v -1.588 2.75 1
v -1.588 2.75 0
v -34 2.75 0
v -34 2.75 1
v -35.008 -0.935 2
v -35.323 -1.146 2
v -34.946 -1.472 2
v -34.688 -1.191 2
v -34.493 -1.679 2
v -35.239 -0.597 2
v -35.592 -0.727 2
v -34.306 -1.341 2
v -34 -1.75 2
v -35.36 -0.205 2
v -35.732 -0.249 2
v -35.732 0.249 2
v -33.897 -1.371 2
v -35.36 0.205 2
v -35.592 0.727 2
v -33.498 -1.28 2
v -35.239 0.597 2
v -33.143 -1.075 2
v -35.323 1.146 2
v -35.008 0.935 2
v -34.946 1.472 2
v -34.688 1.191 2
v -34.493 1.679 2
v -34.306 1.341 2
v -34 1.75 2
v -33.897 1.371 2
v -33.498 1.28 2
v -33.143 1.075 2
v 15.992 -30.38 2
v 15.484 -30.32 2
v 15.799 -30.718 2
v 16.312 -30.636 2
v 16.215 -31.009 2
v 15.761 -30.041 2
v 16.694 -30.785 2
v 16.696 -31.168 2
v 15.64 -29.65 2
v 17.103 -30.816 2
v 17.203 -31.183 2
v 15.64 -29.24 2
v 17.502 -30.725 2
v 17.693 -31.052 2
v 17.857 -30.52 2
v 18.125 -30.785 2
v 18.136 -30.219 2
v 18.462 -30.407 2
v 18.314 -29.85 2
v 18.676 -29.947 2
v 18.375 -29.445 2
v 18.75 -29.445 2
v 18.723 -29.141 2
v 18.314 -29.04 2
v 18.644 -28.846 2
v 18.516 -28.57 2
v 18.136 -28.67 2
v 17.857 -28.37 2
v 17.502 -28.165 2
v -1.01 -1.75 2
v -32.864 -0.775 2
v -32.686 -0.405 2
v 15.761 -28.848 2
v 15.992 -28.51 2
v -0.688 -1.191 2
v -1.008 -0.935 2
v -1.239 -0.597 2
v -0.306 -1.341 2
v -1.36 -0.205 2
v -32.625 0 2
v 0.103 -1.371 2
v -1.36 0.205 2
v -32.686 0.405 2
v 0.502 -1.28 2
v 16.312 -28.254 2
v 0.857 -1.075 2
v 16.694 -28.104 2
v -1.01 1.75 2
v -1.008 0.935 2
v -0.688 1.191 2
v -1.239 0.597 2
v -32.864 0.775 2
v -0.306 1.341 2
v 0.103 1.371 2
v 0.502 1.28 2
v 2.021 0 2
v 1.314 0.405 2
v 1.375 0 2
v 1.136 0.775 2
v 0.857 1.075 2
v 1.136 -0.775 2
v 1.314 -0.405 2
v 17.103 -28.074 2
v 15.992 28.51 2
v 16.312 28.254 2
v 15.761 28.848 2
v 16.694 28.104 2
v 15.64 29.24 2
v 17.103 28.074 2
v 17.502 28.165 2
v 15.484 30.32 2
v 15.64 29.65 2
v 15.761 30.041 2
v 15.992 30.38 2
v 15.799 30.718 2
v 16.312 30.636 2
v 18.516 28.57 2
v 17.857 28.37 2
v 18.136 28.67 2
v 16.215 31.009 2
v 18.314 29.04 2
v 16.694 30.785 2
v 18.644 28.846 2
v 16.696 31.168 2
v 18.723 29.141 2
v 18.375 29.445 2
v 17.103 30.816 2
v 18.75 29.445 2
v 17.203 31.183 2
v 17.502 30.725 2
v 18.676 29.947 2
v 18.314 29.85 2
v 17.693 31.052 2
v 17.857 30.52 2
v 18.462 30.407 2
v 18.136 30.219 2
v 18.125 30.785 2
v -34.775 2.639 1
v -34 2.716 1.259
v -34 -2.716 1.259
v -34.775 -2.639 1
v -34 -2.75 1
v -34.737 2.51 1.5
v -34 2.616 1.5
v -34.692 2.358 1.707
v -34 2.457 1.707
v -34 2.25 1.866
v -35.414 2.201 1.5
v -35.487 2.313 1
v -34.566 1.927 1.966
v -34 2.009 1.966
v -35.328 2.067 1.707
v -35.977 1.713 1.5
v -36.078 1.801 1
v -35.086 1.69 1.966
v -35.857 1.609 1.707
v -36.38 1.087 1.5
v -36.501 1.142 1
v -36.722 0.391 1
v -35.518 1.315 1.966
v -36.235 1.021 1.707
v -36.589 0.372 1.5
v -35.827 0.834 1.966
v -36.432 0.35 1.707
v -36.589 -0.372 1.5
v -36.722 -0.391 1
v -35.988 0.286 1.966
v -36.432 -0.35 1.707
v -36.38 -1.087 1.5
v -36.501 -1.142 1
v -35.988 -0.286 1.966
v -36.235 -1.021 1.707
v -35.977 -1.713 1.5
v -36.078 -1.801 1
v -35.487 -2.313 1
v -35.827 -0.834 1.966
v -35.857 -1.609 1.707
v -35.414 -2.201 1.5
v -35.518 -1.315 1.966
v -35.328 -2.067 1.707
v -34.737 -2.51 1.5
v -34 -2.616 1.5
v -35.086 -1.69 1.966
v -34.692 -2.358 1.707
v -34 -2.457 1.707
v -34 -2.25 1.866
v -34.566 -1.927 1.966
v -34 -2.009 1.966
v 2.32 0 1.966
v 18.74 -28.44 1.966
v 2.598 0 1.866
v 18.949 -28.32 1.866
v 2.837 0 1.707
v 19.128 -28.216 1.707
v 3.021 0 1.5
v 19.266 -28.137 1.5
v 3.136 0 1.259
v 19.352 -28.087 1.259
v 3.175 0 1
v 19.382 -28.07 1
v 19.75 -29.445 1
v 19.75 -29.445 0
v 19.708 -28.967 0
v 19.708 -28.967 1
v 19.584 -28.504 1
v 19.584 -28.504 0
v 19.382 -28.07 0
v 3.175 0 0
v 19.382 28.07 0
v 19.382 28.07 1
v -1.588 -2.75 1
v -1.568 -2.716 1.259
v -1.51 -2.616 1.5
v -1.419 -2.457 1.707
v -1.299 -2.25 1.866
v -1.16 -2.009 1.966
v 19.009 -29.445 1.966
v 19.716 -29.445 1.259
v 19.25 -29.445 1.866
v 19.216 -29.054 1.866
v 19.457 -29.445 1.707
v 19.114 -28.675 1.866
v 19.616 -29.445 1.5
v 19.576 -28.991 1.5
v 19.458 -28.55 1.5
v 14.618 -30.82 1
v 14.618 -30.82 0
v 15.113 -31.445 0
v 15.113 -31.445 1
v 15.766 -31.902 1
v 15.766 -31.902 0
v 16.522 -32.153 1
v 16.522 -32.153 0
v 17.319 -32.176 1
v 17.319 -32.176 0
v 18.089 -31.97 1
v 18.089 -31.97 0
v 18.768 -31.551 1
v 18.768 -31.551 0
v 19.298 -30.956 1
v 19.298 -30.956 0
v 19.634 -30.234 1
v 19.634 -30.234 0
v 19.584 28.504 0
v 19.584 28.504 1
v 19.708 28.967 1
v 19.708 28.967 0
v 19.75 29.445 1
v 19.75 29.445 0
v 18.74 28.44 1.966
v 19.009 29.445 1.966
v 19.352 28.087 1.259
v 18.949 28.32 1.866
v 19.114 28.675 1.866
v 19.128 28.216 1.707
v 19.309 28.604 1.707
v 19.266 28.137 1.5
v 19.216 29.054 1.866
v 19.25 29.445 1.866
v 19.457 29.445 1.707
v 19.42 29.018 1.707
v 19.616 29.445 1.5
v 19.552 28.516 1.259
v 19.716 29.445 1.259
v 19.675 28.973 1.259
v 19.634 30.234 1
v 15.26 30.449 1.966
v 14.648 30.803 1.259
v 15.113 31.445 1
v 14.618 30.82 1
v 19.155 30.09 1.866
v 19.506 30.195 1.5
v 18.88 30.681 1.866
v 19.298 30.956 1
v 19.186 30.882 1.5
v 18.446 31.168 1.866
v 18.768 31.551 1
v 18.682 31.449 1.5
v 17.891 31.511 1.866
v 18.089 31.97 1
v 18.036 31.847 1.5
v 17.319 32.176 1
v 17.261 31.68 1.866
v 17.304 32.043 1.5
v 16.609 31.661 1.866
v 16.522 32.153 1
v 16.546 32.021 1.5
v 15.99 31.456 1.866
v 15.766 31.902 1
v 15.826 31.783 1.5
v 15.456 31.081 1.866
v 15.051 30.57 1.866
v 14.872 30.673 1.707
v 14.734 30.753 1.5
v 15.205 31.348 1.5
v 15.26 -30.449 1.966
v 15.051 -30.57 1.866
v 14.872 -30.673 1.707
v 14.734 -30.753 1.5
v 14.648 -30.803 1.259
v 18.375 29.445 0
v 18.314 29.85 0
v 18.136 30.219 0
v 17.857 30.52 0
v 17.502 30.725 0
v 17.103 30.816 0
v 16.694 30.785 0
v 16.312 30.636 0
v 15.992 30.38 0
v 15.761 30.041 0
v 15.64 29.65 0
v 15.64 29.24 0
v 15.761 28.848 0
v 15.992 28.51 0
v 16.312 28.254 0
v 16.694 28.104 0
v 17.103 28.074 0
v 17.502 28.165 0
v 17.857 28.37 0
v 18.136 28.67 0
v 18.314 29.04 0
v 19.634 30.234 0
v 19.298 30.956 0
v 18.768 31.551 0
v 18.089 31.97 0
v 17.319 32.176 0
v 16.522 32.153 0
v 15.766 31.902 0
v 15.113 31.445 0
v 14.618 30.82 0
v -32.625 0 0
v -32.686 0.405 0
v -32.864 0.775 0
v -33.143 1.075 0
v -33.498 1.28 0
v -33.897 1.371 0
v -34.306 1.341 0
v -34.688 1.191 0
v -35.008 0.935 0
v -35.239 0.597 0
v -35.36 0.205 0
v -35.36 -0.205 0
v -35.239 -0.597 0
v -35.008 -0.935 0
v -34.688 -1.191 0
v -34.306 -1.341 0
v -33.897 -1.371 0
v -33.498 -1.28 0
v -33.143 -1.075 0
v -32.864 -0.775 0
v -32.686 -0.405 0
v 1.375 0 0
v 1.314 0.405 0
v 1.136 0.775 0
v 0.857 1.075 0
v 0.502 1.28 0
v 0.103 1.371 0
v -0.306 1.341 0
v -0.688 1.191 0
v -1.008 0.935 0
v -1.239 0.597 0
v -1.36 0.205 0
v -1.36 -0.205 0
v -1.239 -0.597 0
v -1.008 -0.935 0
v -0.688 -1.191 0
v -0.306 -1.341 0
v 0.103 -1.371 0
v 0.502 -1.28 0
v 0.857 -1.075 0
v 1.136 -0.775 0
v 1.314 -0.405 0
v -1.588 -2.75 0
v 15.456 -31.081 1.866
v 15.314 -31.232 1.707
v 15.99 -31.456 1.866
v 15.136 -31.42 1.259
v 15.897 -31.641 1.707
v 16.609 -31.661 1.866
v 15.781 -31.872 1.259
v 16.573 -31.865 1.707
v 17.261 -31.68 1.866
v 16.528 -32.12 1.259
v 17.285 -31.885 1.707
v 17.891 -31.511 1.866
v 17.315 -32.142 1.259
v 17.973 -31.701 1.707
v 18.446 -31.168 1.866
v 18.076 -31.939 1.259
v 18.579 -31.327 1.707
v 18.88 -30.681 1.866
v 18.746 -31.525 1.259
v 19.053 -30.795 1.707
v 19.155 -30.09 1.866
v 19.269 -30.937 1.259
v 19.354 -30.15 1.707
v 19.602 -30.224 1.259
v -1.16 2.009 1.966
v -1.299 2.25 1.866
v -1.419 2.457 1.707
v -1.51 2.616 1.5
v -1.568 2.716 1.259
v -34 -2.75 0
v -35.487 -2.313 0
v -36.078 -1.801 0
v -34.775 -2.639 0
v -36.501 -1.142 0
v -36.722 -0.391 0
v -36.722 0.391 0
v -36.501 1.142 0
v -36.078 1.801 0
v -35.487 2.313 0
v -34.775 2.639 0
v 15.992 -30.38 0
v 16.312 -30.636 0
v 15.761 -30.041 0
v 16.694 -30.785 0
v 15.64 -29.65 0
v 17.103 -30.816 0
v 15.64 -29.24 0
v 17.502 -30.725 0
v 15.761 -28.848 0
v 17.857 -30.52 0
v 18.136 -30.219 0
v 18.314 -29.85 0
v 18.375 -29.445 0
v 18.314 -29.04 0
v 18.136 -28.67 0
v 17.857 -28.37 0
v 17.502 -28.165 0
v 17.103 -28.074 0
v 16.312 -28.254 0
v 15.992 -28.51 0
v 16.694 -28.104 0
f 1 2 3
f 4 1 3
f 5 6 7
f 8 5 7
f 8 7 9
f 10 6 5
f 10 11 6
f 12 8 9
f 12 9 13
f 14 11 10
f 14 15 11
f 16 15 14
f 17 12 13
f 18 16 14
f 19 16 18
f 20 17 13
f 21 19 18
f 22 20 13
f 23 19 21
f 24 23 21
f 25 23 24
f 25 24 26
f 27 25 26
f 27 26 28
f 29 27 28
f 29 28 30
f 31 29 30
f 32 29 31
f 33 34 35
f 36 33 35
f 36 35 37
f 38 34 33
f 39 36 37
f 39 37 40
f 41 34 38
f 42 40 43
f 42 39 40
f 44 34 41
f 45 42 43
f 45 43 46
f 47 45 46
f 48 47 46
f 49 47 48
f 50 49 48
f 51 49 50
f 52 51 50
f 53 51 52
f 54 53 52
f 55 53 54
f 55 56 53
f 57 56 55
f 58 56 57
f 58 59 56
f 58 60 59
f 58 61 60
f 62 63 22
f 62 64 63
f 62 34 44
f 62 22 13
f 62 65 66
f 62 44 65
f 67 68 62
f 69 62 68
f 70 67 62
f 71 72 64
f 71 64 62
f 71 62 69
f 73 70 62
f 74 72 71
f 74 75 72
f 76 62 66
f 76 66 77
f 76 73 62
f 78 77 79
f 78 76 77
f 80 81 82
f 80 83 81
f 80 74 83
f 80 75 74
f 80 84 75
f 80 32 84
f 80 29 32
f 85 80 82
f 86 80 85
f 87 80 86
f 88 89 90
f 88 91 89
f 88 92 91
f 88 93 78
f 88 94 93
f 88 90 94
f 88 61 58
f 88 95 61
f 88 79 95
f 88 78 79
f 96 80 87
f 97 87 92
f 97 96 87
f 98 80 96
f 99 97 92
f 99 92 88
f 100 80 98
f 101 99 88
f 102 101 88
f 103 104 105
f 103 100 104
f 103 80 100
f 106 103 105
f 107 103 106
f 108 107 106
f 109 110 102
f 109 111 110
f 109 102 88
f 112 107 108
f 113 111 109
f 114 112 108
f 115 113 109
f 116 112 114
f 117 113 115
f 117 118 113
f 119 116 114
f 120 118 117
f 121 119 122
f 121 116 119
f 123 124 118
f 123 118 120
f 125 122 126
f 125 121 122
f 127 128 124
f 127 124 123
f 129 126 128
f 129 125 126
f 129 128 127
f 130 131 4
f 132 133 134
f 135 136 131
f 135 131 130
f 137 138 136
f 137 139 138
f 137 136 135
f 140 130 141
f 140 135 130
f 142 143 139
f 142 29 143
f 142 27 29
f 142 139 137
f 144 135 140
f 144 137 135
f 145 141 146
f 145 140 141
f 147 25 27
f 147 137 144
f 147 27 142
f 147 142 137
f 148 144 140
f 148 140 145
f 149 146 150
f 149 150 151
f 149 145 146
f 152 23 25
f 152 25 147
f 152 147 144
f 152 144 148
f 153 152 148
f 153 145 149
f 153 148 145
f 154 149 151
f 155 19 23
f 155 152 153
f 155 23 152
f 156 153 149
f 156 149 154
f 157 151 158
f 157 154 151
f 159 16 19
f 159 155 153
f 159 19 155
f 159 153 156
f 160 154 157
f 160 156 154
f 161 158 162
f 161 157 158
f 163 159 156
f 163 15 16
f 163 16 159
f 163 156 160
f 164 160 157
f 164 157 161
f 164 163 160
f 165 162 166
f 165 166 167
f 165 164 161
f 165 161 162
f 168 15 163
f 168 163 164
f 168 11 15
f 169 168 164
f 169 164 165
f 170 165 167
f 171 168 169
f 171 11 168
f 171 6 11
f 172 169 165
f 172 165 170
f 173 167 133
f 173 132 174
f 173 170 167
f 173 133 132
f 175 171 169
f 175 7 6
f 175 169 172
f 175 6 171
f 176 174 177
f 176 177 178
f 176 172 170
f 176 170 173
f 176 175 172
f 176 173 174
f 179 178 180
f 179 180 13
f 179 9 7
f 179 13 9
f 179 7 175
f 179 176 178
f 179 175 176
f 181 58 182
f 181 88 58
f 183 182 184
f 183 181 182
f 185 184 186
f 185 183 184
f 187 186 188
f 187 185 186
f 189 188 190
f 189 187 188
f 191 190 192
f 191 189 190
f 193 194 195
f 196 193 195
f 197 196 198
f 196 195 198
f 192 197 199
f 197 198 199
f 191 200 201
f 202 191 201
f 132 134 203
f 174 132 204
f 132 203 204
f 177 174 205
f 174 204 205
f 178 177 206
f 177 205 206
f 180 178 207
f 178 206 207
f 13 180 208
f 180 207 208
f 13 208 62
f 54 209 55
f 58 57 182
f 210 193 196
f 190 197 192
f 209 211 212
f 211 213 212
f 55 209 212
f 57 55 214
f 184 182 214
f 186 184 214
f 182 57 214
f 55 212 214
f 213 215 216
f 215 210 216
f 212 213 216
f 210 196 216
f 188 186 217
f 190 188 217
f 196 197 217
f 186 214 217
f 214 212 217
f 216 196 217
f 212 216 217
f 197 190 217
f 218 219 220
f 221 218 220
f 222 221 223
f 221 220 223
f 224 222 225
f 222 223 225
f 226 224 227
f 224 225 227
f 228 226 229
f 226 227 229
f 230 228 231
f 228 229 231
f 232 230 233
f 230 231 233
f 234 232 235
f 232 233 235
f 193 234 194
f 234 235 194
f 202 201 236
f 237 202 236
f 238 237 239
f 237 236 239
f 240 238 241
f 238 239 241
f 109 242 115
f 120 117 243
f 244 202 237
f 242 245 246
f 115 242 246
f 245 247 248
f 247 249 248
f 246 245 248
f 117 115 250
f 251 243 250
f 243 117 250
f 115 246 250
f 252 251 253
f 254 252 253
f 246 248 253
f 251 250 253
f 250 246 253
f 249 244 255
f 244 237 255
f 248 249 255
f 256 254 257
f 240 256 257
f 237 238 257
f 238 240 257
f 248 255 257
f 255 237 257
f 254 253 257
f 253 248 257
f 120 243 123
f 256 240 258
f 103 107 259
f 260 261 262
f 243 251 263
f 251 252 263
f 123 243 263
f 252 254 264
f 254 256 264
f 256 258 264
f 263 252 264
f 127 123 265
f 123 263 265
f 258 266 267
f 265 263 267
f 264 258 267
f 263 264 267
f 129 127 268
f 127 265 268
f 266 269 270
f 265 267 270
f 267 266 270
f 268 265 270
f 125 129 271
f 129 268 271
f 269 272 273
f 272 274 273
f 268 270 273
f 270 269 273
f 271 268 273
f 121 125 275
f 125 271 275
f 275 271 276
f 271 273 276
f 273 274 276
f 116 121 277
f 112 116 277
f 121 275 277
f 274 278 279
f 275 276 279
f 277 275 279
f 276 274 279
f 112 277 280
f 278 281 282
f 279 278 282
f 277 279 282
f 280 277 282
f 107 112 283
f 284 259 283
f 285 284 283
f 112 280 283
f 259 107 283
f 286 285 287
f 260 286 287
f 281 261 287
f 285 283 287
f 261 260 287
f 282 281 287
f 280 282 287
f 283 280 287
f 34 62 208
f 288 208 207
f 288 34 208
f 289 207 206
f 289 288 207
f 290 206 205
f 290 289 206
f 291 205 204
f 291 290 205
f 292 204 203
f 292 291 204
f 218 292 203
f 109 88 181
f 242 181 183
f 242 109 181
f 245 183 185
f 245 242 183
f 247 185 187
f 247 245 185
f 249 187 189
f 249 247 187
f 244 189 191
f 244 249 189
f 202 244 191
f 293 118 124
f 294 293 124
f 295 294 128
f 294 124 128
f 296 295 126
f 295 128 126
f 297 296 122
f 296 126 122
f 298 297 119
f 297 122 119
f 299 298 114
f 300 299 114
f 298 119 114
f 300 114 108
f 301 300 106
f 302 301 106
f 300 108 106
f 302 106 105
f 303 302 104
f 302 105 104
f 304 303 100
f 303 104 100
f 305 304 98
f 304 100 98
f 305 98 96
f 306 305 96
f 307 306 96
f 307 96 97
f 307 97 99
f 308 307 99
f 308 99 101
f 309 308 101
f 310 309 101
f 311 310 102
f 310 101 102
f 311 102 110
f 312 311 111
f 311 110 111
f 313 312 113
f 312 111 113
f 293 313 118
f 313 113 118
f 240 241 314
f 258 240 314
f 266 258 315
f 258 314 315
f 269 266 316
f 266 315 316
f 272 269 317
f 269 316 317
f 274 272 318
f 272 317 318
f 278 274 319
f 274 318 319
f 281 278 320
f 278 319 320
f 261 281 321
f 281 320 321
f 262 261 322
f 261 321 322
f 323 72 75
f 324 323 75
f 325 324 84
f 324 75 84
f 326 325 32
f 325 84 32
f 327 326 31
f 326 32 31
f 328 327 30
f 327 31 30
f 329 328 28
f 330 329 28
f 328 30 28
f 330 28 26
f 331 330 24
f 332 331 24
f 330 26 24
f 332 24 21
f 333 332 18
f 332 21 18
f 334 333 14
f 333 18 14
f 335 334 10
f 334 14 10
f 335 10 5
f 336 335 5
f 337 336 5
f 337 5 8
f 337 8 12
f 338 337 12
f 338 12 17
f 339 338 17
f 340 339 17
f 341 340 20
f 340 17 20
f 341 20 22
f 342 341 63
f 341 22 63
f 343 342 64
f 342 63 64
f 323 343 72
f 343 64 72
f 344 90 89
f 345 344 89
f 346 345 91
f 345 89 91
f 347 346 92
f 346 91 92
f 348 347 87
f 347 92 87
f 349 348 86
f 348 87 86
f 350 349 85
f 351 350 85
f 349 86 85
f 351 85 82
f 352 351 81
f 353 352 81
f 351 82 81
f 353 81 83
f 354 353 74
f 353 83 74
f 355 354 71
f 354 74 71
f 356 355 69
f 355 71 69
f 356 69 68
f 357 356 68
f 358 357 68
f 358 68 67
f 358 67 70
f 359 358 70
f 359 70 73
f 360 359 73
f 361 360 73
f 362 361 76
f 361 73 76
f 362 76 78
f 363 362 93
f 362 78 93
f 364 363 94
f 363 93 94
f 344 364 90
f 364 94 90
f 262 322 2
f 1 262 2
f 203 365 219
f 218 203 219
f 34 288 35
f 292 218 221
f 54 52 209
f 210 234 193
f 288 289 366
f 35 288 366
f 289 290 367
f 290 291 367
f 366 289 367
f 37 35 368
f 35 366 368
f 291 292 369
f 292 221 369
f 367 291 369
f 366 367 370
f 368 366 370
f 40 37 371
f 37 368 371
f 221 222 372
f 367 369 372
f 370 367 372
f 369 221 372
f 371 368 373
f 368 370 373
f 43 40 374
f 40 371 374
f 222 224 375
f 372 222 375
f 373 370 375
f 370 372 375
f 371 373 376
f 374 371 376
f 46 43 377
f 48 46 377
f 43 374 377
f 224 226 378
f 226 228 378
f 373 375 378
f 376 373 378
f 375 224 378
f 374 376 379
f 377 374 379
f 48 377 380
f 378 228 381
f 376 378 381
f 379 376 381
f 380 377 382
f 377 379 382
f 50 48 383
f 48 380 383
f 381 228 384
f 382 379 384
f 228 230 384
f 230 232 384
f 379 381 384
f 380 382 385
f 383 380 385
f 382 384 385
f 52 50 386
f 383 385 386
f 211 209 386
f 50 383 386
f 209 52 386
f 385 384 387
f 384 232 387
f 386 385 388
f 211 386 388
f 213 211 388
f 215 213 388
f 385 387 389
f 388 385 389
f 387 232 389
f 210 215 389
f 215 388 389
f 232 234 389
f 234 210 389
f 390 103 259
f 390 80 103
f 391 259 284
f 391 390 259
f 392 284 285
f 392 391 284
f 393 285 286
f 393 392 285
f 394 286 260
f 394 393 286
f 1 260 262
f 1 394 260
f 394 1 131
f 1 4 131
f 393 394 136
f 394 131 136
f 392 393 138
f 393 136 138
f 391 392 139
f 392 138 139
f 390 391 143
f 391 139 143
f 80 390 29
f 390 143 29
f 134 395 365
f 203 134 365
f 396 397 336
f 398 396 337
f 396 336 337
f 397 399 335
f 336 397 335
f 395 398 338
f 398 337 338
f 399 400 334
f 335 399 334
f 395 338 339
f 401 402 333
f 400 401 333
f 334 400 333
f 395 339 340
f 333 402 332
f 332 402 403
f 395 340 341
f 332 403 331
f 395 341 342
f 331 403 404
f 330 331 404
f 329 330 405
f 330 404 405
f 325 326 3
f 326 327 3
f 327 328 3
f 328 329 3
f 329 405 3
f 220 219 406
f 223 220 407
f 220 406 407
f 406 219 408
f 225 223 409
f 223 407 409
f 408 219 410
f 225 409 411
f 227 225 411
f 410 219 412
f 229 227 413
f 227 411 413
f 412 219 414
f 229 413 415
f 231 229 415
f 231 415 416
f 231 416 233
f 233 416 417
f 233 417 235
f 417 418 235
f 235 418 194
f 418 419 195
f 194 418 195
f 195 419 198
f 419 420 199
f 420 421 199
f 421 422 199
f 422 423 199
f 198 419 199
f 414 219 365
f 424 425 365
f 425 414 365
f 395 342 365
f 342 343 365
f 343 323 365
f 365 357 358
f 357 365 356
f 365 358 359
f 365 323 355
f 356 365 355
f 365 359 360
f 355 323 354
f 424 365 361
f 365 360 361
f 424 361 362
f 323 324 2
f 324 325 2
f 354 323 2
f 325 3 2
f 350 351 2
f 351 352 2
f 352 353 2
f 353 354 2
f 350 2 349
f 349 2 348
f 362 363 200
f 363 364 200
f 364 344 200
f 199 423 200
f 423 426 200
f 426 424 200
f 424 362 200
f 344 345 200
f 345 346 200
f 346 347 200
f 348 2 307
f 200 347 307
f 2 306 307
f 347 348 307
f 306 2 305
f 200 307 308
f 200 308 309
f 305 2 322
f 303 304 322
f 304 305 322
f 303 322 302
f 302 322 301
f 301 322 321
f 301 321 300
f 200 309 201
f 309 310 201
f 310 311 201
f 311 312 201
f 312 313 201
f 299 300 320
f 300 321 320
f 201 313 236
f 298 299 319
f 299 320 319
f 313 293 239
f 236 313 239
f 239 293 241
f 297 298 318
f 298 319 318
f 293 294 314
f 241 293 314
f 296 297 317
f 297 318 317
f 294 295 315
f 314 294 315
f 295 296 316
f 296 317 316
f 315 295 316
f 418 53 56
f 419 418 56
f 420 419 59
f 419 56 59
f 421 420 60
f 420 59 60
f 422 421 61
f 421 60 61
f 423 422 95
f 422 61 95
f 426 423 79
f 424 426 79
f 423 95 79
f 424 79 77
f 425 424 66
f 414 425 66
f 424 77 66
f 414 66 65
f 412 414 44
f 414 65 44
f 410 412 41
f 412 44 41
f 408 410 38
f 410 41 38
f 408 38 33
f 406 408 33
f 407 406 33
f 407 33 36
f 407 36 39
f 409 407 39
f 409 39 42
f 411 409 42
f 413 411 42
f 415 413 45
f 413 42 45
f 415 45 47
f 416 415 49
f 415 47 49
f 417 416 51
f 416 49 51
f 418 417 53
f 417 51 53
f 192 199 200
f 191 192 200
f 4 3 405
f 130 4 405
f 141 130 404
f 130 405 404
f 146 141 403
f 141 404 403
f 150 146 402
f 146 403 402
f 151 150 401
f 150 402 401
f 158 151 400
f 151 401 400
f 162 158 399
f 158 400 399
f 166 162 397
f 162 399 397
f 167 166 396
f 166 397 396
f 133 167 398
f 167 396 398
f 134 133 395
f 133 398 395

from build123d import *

# Parameters (mm, degrees)
F1_DEPTH = 2
F2_R     = 1.375
F3_DEPTH = 2
F4_R     = 1


with BuildPart() as f1:
    # F0 (on Top) → F1 (new body)
    with BuildSketch(Plane.XY):
        with BuildLine():
            ThreePointArc((-34, -2.75), (-32.055456, -1.944544), (-31.25, 0))
            ThreePointArc((-31.25, 0), (-32.055456, 1.944544), (-34, 2.75))
            ThreePointArc((-34, 2.75), (-36.75, 0), (-34, -2.75))
        make_face()
        with BuildLine():
            ThreePointArc((-34, 2.75), (-32.055456, 1.944544), (-31.25, 0))
            ThreePointArc((-31.25, 0), (-32.055456, -1.944544), (-34, -2.75))
            Line((-34, -2.75), (-1.587713, -2.75))
            Line((-1.587713, -2.75), (14.61843, -30.819864))
            ThreePointArc((14.61843, -30.819864), (15.625, -27.063294), (19.38157, -28.069864))
            Line((19.38157, -28.069864), (3.175426, 0))
            Line((3.175426, 0), (19.38157, 28.069864))
            ThreePointArc((19.38157, 28.069864), (15.625, 27.063294), (14.61843, 30.819864))
            Line((14.61843, 30.819864), (-1.587713, 2.75))
            Line((-1.587713, 2.75), (-34, 2.75))
        make_face()
        with BuildLine():
            ThreePointArc((19.75, 29.444864), (17.711752, 32.10116), (14.61843, 30.819864))
            ThreePointArc((14.61843, 30.819864), (15.625, 27.063294), (19.38157, 28.069864))
            ThreePointArc((19.38157, 28.069864), (19.656296, 28.733111), (19.75, 29.444864))
        make_face()
        with BuildLine():
            ThreePointArc((19.38157, -28.069864), (15.625, -27.063294), (14.61843, -30.819864))
            ThreePointArc((14.61843, -30.819864), (17.711752, -32.10116), (19.75, -29.444864))
            ThreePointArc((19.75, -29.444864), (19.656296, -28.733111), (19.38157, -28.069864))
        make_face()
    extrude(amount=F1_DEPTH)

    # F2 (on face) → F3 (cut, through all)
    with BuildSketch(Plane.XY.offset(2)):
        with Locations((-34, 0)):
            Circle(F2_R)
        with Locations((17, 29.444864)):
            Circle(F2_R)
        Circle(F2_R)
        with Locations((17, -29.444864)):
            Circle(F2_R)
    extrude(amount=-F3_DEPTH, mode=Mode.SUBTRACT)

    # F4
    f4_edges = [f1.edges().sort_by_distance(p)[0] for p in [
        (18.375, 31.826434, 2),
        (11.278498, 14.034932, 2),
        (-17.793857, 2.75, 2),
        (6.515358, -16.784932, 2),
    ]]
    fillet(f4_edges, radius=F4_R)


solid = f1.part
